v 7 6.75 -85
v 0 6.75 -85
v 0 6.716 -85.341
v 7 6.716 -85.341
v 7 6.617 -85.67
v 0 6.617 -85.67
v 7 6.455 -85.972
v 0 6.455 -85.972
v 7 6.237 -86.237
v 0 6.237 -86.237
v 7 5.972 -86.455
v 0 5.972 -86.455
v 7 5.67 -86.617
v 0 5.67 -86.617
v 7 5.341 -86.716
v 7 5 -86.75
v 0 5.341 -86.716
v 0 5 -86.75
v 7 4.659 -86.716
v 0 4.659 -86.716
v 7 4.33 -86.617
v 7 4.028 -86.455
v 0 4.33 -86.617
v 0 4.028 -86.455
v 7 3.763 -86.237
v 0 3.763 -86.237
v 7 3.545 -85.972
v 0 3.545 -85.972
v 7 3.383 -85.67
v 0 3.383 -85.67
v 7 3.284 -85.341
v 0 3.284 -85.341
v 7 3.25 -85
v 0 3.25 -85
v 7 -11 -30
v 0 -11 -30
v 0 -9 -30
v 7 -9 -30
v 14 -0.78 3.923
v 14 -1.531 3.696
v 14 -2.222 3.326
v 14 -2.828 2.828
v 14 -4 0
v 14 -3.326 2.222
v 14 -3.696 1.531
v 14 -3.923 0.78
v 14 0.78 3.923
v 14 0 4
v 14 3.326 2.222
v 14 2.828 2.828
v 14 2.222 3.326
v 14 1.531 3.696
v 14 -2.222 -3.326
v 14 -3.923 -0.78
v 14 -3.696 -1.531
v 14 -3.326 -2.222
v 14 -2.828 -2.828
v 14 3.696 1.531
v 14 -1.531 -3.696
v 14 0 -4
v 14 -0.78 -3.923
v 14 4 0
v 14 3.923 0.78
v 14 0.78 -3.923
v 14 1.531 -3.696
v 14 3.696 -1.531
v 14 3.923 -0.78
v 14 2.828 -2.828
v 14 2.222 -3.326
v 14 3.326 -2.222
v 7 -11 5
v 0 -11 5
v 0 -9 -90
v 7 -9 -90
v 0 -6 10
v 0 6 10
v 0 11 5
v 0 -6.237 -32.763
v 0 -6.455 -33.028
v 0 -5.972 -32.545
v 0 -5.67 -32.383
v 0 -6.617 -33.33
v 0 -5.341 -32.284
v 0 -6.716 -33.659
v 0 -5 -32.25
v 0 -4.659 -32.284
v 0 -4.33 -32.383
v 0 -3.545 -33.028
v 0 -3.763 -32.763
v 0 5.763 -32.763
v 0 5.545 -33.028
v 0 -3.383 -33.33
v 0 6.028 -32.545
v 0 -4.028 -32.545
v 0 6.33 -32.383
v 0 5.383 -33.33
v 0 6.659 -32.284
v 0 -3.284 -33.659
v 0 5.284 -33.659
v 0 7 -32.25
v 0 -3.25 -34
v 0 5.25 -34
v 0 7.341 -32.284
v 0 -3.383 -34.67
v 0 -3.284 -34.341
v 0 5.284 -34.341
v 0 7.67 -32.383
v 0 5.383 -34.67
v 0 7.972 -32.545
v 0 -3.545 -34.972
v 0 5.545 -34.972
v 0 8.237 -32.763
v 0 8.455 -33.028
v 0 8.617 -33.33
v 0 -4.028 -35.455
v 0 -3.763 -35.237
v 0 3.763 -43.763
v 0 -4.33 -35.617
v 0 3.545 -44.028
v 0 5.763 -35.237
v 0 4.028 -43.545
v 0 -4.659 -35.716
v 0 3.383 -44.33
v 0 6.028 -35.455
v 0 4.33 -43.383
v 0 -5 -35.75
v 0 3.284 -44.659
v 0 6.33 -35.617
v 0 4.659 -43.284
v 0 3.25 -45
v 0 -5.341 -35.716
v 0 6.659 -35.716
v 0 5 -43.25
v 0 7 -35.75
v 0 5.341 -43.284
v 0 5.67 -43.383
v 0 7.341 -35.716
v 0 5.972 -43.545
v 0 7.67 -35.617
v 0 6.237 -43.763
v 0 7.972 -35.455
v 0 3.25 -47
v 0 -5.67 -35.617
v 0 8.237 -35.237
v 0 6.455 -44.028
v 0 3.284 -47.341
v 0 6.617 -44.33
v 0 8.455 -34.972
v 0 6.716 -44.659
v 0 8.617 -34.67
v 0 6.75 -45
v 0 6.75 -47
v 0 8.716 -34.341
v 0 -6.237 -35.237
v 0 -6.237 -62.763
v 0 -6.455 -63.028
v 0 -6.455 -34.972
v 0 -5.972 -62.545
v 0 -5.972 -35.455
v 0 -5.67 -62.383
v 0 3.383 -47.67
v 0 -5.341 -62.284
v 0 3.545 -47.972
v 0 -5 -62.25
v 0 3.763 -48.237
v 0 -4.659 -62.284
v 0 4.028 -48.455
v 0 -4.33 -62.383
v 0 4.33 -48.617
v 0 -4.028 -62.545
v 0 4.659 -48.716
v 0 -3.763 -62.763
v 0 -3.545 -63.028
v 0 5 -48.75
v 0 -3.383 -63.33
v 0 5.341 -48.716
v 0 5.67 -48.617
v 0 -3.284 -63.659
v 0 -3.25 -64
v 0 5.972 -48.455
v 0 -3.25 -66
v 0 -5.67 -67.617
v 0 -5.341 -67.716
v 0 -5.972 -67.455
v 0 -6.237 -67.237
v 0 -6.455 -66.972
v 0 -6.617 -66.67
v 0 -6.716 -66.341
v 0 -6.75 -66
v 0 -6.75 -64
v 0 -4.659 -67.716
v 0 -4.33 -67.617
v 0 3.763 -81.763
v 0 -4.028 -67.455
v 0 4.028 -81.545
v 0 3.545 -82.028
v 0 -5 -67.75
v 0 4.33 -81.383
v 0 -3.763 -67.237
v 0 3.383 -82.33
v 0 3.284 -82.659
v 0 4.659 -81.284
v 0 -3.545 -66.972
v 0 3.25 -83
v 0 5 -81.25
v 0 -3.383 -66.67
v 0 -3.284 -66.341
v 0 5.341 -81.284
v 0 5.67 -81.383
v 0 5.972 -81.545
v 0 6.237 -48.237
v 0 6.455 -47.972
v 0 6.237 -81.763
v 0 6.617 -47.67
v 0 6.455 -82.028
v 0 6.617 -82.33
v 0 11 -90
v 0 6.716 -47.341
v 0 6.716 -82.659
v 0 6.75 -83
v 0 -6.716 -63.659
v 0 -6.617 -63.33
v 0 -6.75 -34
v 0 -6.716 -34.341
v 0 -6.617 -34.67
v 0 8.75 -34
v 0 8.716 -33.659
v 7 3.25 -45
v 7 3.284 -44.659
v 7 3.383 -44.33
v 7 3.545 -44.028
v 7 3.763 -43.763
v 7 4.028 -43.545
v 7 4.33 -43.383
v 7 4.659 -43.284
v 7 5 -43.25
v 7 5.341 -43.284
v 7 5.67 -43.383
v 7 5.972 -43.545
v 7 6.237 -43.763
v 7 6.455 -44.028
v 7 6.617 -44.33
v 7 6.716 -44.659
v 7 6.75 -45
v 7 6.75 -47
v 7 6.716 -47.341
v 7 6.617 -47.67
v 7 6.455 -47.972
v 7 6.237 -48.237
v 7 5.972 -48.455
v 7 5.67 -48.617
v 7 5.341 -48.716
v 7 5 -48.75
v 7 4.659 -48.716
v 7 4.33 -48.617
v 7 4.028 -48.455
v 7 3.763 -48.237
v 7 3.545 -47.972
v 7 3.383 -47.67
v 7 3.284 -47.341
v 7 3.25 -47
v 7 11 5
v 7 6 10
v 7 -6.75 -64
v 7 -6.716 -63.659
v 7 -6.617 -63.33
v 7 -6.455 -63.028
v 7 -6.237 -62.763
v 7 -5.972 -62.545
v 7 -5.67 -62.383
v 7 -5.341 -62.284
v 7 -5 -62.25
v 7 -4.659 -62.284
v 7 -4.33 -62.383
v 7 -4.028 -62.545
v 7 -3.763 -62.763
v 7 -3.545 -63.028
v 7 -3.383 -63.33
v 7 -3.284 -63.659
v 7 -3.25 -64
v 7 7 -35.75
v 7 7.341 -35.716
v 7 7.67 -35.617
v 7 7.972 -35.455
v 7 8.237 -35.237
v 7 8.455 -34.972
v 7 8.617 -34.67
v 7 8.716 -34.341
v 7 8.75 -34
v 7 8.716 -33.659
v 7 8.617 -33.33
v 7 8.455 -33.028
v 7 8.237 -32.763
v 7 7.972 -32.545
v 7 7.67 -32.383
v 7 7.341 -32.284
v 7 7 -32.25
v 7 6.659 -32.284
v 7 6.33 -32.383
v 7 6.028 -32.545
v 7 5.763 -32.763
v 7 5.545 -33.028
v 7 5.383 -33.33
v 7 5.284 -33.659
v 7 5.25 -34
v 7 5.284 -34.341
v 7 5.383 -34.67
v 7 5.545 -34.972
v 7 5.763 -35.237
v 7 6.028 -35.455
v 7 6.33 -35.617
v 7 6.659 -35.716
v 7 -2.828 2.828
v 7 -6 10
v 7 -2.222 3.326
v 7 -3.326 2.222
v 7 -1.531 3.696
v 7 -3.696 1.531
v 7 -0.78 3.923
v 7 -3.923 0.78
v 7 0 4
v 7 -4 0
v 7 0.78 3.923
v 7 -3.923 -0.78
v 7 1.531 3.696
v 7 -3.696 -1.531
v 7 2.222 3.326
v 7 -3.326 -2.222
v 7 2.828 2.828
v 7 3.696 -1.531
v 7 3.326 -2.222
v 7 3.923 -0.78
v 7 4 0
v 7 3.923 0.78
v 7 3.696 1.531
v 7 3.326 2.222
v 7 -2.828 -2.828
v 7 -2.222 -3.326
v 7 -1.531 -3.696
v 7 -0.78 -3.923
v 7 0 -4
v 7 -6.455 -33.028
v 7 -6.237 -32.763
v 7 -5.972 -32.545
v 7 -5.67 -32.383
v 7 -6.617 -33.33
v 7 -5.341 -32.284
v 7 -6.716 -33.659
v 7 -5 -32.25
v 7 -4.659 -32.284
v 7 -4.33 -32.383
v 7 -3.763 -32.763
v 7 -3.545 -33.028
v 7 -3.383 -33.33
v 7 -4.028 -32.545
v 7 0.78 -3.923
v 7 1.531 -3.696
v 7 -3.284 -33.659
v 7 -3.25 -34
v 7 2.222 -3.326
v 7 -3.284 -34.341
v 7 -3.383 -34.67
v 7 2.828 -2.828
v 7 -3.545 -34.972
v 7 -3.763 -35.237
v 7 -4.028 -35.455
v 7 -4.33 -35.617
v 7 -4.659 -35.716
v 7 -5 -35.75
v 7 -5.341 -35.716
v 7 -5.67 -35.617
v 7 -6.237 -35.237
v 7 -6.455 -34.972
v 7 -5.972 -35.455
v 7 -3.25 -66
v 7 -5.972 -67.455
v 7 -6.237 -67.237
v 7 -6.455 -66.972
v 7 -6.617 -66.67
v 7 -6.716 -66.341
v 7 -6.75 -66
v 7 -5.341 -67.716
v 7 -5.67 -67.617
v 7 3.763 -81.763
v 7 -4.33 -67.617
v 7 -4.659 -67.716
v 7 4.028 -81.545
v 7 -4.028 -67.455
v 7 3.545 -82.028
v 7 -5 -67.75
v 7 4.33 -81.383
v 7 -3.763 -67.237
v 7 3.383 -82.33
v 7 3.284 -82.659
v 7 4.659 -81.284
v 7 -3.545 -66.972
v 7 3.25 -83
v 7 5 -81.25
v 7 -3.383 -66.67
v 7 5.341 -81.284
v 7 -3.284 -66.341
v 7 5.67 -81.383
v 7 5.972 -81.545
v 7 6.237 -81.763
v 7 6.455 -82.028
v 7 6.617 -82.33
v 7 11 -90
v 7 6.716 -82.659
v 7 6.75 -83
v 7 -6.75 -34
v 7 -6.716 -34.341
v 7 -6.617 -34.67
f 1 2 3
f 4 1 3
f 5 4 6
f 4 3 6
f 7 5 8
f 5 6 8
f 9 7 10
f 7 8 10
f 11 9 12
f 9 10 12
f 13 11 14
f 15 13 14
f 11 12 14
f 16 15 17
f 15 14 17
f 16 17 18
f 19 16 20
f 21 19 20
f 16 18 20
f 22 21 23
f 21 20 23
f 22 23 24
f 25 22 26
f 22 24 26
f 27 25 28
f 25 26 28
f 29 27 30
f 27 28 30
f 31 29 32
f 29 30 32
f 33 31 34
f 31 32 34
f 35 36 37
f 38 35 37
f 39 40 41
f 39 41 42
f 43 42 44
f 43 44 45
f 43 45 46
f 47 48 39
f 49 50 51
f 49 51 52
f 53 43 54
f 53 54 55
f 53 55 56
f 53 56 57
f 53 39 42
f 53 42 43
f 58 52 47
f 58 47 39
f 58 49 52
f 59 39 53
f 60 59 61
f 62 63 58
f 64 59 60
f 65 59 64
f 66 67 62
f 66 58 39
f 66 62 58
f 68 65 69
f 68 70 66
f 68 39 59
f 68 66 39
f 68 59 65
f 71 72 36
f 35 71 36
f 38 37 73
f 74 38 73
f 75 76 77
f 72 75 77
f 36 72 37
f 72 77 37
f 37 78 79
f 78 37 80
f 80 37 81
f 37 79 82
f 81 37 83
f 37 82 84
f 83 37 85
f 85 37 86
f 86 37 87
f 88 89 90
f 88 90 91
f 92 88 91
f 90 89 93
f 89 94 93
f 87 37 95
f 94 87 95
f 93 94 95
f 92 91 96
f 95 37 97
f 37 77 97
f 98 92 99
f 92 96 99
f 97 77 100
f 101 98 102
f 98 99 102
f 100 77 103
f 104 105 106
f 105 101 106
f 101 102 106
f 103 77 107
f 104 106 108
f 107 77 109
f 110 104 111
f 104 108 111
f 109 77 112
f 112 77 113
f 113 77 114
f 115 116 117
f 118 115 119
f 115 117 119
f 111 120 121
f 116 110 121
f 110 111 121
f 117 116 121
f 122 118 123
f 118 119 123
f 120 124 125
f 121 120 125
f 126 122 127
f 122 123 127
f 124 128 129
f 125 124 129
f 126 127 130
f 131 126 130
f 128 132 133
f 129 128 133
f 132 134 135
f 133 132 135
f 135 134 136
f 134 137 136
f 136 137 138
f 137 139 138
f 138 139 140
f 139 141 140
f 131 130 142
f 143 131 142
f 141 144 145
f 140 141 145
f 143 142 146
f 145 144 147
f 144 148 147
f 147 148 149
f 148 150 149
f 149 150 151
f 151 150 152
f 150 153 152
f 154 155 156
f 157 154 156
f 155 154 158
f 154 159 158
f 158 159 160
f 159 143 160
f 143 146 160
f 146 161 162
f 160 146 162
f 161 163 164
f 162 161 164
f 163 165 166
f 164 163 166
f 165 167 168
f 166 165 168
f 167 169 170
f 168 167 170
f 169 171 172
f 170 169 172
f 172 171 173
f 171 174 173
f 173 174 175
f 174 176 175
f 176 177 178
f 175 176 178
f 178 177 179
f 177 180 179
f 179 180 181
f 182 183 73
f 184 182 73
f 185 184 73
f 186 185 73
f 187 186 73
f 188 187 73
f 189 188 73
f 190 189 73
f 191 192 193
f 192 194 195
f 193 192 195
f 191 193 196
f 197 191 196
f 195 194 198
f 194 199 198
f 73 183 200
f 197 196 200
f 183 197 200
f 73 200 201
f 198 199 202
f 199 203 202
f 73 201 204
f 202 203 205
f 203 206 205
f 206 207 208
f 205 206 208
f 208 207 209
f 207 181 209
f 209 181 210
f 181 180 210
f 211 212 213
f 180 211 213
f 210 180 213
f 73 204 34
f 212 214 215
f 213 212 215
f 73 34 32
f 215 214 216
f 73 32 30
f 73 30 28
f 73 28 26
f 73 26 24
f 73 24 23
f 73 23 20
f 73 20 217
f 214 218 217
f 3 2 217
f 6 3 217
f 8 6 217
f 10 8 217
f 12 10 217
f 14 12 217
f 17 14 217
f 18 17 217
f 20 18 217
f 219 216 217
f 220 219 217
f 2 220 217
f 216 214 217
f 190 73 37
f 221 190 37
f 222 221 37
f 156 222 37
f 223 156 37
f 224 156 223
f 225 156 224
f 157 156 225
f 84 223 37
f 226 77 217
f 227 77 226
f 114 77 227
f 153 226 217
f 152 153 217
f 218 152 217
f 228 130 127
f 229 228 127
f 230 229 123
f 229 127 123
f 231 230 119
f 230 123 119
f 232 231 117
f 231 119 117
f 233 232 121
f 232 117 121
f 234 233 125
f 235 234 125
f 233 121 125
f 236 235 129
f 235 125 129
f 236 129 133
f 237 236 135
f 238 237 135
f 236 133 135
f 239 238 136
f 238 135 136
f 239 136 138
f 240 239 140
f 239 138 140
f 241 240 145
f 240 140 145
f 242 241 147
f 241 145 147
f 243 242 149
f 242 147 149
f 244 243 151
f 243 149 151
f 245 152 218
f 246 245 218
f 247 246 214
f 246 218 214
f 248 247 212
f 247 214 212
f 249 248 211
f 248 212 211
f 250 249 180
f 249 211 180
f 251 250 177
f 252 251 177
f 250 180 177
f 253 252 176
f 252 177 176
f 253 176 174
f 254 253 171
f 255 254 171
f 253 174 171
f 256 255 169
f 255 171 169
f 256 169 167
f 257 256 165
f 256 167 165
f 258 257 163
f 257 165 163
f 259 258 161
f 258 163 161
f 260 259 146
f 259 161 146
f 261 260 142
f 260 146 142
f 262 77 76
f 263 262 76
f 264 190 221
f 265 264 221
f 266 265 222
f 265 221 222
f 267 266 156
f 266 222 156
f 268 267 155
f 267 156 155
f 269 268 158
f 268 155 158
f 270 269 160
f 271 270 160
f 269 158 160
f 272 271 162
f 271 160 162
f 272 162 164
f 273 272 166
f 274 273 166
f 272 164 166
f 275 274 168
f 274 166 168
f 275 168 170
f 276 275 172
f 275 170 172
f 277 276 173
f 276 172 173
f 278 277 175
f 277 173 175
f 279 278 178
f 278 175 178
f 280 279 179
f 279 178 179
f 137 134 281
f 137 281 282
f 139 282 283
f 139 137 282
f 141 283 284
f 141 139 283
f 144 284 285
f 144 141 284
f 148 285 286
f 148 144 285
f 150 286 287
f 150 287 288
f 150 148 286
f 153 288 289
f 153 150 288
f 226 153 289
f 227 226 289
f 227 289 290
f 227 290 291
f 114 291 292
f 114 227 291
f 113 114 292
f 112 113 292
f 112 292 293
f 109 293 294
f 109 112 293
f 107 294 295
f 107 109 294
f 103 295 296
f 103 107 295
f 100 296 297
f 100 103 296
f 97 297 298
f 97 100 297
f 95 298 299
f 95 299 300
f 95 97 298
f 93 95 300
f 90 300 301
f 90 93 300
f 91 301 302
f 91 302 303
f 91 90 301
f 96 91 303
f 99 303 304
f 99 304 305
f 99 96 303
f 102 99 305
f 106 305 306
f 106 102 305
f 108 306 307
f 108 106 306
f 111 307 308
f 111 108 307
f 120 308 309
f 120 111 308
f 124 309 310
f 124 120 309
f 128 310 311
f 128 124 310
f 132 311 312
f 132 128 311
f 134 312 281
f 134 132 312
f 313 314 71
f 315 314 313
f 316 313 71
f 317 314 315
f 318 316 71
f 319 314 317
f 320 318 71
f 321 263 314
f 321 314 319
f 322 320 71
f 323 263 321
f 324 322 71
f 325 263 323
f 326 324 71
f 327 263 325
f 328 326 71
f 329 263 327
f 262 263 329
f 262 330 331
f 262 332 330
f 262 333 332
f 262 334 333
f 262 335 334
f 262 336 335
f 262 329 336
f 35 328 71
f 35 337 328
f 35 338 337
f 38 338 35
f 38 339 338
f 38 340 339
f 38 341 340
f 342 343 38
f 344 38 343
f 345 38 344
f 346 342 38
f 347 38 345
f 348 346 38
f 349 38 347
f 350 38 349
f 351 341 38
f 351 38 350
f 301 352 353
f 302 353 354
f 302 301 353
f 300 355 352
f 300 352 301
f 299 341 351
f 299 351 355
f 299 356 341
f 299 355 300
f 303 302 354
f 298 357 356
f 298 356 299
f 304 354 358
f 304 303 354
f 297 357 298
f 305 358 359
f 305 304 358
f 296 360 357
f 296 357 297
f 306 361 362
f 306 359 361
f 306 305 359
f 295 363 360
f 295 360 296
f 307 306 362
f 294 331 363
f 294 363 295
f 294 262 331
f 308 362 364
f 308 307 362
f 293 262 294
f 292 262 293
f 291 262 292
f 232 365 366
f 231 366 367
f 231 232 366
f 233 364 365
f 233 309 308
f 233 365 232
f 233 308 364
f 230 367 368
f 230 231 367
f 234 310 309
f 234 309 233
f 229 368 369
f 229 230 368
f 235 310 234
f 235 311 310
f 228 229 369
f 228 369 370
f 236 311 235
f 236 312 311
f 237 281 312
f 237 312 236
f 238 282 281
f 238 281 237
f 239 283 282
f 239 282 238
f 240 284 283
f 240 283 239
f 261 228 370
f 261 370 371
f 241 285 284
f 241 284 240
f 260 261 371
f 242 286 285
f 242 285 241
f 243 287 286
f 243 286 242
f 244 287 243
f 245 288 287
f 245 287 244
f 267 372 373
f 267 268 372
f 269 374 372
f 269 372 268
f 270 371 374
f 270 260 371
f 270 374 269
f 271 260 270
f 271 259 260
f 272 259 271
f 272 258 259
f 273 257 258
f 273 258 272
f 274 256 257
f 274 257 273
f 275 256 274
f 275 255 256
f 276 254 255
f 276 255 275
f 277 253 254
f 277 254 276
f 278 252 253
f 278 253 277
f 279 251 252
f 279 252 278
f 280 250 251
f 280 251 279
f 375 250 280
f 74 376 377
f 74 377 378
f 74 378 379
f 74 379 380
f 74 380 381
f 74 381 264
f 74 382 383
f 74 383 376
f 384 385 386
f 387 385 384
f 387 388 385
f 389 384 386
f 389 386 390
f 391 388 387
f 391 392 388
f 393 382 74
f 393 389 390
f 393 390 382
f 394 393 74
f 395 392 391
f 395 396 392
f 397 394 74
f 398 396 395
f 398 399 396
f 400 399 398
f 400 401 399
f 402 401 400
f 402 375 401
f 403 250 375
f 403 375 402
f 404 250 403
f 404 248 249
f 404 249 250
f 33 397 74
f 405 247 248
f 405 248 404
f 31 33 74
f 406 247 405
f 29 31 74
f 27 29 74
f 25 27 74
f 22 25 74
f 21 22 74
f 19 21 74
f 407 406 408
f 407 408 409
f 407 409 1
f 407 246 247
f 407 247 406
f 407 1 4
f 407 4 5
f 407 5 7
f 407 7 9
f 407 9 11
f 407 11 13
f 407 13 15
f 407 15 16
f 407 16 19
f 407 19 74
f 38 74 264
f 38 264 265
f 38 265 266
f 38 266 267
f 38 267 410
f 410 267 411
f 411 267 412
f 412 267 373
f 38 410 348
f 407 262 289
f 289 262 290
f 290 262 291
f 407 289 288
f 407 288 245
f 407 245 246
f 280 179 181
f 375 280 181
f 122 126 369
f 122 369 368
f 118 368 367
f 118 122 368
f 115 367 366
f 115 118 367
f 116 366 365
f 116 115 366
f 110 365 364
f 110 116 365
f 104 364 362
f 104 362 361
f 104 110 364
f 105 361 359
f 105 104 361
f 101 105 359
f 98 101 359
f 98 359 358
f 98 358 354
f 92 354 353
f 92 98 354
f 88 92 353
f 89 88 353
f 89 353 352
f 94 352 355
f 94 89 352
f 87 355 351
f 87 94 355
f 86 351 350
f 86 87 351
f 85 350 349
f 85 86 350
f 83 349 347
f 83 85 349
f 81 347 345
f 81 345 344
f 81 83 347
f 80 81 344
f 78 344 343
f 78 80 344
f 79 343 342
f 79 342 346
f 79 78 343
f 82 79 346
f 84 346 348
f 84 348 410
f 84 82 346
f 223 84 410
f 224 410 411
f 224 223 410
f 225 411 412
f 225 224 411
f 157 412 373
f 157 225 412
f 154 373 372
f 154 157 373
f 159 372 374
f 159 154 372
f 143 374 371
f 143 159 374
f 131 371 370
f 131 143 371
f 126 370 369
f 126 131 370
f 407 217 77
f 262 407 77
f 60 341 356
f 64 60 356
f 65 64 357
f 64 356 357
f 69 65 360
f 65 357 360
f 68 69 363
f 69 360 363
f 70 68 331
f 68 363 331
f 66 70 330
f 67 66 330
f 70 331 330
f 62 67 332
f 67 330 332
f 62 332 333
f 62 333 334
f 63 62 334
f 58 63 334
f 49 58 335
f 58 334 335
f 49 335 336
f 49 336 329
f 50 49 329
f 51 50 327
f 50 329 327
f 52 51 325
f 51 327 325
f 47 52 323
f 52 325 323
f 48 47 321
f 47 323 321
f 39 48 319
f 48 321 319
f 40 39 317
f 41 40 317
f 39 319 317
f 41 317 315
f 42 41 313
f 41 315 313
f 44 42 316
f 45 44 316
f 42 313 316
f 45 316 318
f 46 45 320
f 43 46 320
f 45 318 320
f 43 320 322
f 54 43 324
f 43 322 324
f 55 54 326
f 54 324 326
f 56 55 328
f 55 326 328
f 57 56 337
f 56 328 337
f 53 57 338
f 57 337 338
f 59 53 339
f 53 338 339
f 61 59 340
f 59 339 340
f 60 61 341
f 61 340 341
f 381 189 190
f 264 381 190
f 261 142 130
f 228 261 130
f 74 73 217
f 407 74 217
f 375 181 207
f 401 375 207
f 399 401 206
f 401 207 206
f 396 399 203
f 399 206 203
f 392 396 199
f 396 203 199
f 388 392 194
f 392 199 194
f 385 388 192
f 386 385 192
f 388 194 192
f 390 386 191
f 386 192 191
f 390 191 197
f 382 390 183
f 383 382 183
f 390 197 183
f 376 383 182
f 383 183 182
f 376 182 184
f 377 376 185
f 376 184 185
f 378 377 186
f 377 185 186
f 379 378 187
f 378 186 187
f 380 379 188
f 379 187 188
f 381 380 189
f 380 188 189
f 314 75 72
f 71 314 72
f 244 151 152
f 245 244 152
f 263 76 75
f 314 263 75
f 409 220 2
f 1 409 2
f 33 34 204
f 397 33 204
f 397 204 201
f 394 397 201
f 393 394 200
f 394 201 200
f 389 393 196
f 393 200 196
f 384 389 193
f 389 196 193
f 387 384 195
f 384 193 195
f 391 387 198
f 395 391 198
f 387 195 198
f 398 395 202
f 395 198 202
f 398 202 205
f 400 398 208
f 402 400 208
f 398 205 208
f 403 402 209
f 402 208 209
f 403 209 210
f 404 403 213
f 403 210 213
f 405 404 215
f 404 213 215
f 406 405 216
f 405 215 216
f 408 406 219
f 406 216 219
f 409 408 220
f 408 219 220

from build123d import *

# Parameters (mm, degrees)
SKETCH1_R           = 1.75
BOSS_EXTRUDE1_DEPTH = 7
BOSS_EXTRUDE2_START = 7
SKETCH1_4_R         = 4
BOSS_EXTRUDE2_DEPTH = 7


with BuildPart() as part:
    # Sketch1 → Boss-Extrude1 (new body)
    with BuildSketch(Plane(origin=(0, 0, 0), x_dir=(0, 0, -1), z_dir=(1, 0, 0))):
        Polygon((-5, 11), (-10, 6), (-10, -6), (-5, -11), (30, -11), (30, -9), (90, -9), (90, 11), align=None)
        with Locations((34, 7)):
            Circle(SKETCH1_R, mode=Mode.SUBTRACT)
        with Locations((34, -5)):
            Circle(SKETCH1_R, mode=Mode.SUBTRACT)
        with BuildLine():
            Line((45, 6.75), (47, 6.75))
            ThreePointArc((47, 6.75), (48.75, 5), (47, 3.25))
            Line((47, 3.25), (45, 3.25))
            ThreePointArc((45, 3.25), (43.25, 5), (45, 6.75))
        make_face(mode=Mode.SUBTRACT)
        with BuildLine():
            Line((64, -3.25), (66, -3.25))
            ThreePointArc((66, -3.25), (67.75, -5), (66, -6.75))
            Line((66, -6.75), (64, -6.75))
            ThreePointArc((64, -6.75), (62.25, -5), (64, -3.25))
        make_face(mode=Mode.SUBTRACT)
        with BuildLine():
            Line((85, 3.25), (83, 3.25))
            ThreePointArc((83, 3.25), (81.25, 5), (83, 6.75))
            Line((83, 6.75), (85, 6.75))
            ThreePointArc((85, 6.75), (86.75, 5), (85, 3.25))
        make_face(mode=Mode.SUBTRACT)
    extrude(amount=BOSS_EXTRUDE1_DEPTH)

    # Sketch1<4> → Boss-Extrude2 (add)
    with BuildSketch(Plane(origin=(0, 0, 0), x_dir=(0, 0, -1), z_dir=(1, 0, 0)).offset(BOSS_EXTRUDE2_START)):
        Circle(SKETCH1_4_R)
    extrude(amount=BOSS_EXTRUDE2_DEPTH)


solid = part.part
